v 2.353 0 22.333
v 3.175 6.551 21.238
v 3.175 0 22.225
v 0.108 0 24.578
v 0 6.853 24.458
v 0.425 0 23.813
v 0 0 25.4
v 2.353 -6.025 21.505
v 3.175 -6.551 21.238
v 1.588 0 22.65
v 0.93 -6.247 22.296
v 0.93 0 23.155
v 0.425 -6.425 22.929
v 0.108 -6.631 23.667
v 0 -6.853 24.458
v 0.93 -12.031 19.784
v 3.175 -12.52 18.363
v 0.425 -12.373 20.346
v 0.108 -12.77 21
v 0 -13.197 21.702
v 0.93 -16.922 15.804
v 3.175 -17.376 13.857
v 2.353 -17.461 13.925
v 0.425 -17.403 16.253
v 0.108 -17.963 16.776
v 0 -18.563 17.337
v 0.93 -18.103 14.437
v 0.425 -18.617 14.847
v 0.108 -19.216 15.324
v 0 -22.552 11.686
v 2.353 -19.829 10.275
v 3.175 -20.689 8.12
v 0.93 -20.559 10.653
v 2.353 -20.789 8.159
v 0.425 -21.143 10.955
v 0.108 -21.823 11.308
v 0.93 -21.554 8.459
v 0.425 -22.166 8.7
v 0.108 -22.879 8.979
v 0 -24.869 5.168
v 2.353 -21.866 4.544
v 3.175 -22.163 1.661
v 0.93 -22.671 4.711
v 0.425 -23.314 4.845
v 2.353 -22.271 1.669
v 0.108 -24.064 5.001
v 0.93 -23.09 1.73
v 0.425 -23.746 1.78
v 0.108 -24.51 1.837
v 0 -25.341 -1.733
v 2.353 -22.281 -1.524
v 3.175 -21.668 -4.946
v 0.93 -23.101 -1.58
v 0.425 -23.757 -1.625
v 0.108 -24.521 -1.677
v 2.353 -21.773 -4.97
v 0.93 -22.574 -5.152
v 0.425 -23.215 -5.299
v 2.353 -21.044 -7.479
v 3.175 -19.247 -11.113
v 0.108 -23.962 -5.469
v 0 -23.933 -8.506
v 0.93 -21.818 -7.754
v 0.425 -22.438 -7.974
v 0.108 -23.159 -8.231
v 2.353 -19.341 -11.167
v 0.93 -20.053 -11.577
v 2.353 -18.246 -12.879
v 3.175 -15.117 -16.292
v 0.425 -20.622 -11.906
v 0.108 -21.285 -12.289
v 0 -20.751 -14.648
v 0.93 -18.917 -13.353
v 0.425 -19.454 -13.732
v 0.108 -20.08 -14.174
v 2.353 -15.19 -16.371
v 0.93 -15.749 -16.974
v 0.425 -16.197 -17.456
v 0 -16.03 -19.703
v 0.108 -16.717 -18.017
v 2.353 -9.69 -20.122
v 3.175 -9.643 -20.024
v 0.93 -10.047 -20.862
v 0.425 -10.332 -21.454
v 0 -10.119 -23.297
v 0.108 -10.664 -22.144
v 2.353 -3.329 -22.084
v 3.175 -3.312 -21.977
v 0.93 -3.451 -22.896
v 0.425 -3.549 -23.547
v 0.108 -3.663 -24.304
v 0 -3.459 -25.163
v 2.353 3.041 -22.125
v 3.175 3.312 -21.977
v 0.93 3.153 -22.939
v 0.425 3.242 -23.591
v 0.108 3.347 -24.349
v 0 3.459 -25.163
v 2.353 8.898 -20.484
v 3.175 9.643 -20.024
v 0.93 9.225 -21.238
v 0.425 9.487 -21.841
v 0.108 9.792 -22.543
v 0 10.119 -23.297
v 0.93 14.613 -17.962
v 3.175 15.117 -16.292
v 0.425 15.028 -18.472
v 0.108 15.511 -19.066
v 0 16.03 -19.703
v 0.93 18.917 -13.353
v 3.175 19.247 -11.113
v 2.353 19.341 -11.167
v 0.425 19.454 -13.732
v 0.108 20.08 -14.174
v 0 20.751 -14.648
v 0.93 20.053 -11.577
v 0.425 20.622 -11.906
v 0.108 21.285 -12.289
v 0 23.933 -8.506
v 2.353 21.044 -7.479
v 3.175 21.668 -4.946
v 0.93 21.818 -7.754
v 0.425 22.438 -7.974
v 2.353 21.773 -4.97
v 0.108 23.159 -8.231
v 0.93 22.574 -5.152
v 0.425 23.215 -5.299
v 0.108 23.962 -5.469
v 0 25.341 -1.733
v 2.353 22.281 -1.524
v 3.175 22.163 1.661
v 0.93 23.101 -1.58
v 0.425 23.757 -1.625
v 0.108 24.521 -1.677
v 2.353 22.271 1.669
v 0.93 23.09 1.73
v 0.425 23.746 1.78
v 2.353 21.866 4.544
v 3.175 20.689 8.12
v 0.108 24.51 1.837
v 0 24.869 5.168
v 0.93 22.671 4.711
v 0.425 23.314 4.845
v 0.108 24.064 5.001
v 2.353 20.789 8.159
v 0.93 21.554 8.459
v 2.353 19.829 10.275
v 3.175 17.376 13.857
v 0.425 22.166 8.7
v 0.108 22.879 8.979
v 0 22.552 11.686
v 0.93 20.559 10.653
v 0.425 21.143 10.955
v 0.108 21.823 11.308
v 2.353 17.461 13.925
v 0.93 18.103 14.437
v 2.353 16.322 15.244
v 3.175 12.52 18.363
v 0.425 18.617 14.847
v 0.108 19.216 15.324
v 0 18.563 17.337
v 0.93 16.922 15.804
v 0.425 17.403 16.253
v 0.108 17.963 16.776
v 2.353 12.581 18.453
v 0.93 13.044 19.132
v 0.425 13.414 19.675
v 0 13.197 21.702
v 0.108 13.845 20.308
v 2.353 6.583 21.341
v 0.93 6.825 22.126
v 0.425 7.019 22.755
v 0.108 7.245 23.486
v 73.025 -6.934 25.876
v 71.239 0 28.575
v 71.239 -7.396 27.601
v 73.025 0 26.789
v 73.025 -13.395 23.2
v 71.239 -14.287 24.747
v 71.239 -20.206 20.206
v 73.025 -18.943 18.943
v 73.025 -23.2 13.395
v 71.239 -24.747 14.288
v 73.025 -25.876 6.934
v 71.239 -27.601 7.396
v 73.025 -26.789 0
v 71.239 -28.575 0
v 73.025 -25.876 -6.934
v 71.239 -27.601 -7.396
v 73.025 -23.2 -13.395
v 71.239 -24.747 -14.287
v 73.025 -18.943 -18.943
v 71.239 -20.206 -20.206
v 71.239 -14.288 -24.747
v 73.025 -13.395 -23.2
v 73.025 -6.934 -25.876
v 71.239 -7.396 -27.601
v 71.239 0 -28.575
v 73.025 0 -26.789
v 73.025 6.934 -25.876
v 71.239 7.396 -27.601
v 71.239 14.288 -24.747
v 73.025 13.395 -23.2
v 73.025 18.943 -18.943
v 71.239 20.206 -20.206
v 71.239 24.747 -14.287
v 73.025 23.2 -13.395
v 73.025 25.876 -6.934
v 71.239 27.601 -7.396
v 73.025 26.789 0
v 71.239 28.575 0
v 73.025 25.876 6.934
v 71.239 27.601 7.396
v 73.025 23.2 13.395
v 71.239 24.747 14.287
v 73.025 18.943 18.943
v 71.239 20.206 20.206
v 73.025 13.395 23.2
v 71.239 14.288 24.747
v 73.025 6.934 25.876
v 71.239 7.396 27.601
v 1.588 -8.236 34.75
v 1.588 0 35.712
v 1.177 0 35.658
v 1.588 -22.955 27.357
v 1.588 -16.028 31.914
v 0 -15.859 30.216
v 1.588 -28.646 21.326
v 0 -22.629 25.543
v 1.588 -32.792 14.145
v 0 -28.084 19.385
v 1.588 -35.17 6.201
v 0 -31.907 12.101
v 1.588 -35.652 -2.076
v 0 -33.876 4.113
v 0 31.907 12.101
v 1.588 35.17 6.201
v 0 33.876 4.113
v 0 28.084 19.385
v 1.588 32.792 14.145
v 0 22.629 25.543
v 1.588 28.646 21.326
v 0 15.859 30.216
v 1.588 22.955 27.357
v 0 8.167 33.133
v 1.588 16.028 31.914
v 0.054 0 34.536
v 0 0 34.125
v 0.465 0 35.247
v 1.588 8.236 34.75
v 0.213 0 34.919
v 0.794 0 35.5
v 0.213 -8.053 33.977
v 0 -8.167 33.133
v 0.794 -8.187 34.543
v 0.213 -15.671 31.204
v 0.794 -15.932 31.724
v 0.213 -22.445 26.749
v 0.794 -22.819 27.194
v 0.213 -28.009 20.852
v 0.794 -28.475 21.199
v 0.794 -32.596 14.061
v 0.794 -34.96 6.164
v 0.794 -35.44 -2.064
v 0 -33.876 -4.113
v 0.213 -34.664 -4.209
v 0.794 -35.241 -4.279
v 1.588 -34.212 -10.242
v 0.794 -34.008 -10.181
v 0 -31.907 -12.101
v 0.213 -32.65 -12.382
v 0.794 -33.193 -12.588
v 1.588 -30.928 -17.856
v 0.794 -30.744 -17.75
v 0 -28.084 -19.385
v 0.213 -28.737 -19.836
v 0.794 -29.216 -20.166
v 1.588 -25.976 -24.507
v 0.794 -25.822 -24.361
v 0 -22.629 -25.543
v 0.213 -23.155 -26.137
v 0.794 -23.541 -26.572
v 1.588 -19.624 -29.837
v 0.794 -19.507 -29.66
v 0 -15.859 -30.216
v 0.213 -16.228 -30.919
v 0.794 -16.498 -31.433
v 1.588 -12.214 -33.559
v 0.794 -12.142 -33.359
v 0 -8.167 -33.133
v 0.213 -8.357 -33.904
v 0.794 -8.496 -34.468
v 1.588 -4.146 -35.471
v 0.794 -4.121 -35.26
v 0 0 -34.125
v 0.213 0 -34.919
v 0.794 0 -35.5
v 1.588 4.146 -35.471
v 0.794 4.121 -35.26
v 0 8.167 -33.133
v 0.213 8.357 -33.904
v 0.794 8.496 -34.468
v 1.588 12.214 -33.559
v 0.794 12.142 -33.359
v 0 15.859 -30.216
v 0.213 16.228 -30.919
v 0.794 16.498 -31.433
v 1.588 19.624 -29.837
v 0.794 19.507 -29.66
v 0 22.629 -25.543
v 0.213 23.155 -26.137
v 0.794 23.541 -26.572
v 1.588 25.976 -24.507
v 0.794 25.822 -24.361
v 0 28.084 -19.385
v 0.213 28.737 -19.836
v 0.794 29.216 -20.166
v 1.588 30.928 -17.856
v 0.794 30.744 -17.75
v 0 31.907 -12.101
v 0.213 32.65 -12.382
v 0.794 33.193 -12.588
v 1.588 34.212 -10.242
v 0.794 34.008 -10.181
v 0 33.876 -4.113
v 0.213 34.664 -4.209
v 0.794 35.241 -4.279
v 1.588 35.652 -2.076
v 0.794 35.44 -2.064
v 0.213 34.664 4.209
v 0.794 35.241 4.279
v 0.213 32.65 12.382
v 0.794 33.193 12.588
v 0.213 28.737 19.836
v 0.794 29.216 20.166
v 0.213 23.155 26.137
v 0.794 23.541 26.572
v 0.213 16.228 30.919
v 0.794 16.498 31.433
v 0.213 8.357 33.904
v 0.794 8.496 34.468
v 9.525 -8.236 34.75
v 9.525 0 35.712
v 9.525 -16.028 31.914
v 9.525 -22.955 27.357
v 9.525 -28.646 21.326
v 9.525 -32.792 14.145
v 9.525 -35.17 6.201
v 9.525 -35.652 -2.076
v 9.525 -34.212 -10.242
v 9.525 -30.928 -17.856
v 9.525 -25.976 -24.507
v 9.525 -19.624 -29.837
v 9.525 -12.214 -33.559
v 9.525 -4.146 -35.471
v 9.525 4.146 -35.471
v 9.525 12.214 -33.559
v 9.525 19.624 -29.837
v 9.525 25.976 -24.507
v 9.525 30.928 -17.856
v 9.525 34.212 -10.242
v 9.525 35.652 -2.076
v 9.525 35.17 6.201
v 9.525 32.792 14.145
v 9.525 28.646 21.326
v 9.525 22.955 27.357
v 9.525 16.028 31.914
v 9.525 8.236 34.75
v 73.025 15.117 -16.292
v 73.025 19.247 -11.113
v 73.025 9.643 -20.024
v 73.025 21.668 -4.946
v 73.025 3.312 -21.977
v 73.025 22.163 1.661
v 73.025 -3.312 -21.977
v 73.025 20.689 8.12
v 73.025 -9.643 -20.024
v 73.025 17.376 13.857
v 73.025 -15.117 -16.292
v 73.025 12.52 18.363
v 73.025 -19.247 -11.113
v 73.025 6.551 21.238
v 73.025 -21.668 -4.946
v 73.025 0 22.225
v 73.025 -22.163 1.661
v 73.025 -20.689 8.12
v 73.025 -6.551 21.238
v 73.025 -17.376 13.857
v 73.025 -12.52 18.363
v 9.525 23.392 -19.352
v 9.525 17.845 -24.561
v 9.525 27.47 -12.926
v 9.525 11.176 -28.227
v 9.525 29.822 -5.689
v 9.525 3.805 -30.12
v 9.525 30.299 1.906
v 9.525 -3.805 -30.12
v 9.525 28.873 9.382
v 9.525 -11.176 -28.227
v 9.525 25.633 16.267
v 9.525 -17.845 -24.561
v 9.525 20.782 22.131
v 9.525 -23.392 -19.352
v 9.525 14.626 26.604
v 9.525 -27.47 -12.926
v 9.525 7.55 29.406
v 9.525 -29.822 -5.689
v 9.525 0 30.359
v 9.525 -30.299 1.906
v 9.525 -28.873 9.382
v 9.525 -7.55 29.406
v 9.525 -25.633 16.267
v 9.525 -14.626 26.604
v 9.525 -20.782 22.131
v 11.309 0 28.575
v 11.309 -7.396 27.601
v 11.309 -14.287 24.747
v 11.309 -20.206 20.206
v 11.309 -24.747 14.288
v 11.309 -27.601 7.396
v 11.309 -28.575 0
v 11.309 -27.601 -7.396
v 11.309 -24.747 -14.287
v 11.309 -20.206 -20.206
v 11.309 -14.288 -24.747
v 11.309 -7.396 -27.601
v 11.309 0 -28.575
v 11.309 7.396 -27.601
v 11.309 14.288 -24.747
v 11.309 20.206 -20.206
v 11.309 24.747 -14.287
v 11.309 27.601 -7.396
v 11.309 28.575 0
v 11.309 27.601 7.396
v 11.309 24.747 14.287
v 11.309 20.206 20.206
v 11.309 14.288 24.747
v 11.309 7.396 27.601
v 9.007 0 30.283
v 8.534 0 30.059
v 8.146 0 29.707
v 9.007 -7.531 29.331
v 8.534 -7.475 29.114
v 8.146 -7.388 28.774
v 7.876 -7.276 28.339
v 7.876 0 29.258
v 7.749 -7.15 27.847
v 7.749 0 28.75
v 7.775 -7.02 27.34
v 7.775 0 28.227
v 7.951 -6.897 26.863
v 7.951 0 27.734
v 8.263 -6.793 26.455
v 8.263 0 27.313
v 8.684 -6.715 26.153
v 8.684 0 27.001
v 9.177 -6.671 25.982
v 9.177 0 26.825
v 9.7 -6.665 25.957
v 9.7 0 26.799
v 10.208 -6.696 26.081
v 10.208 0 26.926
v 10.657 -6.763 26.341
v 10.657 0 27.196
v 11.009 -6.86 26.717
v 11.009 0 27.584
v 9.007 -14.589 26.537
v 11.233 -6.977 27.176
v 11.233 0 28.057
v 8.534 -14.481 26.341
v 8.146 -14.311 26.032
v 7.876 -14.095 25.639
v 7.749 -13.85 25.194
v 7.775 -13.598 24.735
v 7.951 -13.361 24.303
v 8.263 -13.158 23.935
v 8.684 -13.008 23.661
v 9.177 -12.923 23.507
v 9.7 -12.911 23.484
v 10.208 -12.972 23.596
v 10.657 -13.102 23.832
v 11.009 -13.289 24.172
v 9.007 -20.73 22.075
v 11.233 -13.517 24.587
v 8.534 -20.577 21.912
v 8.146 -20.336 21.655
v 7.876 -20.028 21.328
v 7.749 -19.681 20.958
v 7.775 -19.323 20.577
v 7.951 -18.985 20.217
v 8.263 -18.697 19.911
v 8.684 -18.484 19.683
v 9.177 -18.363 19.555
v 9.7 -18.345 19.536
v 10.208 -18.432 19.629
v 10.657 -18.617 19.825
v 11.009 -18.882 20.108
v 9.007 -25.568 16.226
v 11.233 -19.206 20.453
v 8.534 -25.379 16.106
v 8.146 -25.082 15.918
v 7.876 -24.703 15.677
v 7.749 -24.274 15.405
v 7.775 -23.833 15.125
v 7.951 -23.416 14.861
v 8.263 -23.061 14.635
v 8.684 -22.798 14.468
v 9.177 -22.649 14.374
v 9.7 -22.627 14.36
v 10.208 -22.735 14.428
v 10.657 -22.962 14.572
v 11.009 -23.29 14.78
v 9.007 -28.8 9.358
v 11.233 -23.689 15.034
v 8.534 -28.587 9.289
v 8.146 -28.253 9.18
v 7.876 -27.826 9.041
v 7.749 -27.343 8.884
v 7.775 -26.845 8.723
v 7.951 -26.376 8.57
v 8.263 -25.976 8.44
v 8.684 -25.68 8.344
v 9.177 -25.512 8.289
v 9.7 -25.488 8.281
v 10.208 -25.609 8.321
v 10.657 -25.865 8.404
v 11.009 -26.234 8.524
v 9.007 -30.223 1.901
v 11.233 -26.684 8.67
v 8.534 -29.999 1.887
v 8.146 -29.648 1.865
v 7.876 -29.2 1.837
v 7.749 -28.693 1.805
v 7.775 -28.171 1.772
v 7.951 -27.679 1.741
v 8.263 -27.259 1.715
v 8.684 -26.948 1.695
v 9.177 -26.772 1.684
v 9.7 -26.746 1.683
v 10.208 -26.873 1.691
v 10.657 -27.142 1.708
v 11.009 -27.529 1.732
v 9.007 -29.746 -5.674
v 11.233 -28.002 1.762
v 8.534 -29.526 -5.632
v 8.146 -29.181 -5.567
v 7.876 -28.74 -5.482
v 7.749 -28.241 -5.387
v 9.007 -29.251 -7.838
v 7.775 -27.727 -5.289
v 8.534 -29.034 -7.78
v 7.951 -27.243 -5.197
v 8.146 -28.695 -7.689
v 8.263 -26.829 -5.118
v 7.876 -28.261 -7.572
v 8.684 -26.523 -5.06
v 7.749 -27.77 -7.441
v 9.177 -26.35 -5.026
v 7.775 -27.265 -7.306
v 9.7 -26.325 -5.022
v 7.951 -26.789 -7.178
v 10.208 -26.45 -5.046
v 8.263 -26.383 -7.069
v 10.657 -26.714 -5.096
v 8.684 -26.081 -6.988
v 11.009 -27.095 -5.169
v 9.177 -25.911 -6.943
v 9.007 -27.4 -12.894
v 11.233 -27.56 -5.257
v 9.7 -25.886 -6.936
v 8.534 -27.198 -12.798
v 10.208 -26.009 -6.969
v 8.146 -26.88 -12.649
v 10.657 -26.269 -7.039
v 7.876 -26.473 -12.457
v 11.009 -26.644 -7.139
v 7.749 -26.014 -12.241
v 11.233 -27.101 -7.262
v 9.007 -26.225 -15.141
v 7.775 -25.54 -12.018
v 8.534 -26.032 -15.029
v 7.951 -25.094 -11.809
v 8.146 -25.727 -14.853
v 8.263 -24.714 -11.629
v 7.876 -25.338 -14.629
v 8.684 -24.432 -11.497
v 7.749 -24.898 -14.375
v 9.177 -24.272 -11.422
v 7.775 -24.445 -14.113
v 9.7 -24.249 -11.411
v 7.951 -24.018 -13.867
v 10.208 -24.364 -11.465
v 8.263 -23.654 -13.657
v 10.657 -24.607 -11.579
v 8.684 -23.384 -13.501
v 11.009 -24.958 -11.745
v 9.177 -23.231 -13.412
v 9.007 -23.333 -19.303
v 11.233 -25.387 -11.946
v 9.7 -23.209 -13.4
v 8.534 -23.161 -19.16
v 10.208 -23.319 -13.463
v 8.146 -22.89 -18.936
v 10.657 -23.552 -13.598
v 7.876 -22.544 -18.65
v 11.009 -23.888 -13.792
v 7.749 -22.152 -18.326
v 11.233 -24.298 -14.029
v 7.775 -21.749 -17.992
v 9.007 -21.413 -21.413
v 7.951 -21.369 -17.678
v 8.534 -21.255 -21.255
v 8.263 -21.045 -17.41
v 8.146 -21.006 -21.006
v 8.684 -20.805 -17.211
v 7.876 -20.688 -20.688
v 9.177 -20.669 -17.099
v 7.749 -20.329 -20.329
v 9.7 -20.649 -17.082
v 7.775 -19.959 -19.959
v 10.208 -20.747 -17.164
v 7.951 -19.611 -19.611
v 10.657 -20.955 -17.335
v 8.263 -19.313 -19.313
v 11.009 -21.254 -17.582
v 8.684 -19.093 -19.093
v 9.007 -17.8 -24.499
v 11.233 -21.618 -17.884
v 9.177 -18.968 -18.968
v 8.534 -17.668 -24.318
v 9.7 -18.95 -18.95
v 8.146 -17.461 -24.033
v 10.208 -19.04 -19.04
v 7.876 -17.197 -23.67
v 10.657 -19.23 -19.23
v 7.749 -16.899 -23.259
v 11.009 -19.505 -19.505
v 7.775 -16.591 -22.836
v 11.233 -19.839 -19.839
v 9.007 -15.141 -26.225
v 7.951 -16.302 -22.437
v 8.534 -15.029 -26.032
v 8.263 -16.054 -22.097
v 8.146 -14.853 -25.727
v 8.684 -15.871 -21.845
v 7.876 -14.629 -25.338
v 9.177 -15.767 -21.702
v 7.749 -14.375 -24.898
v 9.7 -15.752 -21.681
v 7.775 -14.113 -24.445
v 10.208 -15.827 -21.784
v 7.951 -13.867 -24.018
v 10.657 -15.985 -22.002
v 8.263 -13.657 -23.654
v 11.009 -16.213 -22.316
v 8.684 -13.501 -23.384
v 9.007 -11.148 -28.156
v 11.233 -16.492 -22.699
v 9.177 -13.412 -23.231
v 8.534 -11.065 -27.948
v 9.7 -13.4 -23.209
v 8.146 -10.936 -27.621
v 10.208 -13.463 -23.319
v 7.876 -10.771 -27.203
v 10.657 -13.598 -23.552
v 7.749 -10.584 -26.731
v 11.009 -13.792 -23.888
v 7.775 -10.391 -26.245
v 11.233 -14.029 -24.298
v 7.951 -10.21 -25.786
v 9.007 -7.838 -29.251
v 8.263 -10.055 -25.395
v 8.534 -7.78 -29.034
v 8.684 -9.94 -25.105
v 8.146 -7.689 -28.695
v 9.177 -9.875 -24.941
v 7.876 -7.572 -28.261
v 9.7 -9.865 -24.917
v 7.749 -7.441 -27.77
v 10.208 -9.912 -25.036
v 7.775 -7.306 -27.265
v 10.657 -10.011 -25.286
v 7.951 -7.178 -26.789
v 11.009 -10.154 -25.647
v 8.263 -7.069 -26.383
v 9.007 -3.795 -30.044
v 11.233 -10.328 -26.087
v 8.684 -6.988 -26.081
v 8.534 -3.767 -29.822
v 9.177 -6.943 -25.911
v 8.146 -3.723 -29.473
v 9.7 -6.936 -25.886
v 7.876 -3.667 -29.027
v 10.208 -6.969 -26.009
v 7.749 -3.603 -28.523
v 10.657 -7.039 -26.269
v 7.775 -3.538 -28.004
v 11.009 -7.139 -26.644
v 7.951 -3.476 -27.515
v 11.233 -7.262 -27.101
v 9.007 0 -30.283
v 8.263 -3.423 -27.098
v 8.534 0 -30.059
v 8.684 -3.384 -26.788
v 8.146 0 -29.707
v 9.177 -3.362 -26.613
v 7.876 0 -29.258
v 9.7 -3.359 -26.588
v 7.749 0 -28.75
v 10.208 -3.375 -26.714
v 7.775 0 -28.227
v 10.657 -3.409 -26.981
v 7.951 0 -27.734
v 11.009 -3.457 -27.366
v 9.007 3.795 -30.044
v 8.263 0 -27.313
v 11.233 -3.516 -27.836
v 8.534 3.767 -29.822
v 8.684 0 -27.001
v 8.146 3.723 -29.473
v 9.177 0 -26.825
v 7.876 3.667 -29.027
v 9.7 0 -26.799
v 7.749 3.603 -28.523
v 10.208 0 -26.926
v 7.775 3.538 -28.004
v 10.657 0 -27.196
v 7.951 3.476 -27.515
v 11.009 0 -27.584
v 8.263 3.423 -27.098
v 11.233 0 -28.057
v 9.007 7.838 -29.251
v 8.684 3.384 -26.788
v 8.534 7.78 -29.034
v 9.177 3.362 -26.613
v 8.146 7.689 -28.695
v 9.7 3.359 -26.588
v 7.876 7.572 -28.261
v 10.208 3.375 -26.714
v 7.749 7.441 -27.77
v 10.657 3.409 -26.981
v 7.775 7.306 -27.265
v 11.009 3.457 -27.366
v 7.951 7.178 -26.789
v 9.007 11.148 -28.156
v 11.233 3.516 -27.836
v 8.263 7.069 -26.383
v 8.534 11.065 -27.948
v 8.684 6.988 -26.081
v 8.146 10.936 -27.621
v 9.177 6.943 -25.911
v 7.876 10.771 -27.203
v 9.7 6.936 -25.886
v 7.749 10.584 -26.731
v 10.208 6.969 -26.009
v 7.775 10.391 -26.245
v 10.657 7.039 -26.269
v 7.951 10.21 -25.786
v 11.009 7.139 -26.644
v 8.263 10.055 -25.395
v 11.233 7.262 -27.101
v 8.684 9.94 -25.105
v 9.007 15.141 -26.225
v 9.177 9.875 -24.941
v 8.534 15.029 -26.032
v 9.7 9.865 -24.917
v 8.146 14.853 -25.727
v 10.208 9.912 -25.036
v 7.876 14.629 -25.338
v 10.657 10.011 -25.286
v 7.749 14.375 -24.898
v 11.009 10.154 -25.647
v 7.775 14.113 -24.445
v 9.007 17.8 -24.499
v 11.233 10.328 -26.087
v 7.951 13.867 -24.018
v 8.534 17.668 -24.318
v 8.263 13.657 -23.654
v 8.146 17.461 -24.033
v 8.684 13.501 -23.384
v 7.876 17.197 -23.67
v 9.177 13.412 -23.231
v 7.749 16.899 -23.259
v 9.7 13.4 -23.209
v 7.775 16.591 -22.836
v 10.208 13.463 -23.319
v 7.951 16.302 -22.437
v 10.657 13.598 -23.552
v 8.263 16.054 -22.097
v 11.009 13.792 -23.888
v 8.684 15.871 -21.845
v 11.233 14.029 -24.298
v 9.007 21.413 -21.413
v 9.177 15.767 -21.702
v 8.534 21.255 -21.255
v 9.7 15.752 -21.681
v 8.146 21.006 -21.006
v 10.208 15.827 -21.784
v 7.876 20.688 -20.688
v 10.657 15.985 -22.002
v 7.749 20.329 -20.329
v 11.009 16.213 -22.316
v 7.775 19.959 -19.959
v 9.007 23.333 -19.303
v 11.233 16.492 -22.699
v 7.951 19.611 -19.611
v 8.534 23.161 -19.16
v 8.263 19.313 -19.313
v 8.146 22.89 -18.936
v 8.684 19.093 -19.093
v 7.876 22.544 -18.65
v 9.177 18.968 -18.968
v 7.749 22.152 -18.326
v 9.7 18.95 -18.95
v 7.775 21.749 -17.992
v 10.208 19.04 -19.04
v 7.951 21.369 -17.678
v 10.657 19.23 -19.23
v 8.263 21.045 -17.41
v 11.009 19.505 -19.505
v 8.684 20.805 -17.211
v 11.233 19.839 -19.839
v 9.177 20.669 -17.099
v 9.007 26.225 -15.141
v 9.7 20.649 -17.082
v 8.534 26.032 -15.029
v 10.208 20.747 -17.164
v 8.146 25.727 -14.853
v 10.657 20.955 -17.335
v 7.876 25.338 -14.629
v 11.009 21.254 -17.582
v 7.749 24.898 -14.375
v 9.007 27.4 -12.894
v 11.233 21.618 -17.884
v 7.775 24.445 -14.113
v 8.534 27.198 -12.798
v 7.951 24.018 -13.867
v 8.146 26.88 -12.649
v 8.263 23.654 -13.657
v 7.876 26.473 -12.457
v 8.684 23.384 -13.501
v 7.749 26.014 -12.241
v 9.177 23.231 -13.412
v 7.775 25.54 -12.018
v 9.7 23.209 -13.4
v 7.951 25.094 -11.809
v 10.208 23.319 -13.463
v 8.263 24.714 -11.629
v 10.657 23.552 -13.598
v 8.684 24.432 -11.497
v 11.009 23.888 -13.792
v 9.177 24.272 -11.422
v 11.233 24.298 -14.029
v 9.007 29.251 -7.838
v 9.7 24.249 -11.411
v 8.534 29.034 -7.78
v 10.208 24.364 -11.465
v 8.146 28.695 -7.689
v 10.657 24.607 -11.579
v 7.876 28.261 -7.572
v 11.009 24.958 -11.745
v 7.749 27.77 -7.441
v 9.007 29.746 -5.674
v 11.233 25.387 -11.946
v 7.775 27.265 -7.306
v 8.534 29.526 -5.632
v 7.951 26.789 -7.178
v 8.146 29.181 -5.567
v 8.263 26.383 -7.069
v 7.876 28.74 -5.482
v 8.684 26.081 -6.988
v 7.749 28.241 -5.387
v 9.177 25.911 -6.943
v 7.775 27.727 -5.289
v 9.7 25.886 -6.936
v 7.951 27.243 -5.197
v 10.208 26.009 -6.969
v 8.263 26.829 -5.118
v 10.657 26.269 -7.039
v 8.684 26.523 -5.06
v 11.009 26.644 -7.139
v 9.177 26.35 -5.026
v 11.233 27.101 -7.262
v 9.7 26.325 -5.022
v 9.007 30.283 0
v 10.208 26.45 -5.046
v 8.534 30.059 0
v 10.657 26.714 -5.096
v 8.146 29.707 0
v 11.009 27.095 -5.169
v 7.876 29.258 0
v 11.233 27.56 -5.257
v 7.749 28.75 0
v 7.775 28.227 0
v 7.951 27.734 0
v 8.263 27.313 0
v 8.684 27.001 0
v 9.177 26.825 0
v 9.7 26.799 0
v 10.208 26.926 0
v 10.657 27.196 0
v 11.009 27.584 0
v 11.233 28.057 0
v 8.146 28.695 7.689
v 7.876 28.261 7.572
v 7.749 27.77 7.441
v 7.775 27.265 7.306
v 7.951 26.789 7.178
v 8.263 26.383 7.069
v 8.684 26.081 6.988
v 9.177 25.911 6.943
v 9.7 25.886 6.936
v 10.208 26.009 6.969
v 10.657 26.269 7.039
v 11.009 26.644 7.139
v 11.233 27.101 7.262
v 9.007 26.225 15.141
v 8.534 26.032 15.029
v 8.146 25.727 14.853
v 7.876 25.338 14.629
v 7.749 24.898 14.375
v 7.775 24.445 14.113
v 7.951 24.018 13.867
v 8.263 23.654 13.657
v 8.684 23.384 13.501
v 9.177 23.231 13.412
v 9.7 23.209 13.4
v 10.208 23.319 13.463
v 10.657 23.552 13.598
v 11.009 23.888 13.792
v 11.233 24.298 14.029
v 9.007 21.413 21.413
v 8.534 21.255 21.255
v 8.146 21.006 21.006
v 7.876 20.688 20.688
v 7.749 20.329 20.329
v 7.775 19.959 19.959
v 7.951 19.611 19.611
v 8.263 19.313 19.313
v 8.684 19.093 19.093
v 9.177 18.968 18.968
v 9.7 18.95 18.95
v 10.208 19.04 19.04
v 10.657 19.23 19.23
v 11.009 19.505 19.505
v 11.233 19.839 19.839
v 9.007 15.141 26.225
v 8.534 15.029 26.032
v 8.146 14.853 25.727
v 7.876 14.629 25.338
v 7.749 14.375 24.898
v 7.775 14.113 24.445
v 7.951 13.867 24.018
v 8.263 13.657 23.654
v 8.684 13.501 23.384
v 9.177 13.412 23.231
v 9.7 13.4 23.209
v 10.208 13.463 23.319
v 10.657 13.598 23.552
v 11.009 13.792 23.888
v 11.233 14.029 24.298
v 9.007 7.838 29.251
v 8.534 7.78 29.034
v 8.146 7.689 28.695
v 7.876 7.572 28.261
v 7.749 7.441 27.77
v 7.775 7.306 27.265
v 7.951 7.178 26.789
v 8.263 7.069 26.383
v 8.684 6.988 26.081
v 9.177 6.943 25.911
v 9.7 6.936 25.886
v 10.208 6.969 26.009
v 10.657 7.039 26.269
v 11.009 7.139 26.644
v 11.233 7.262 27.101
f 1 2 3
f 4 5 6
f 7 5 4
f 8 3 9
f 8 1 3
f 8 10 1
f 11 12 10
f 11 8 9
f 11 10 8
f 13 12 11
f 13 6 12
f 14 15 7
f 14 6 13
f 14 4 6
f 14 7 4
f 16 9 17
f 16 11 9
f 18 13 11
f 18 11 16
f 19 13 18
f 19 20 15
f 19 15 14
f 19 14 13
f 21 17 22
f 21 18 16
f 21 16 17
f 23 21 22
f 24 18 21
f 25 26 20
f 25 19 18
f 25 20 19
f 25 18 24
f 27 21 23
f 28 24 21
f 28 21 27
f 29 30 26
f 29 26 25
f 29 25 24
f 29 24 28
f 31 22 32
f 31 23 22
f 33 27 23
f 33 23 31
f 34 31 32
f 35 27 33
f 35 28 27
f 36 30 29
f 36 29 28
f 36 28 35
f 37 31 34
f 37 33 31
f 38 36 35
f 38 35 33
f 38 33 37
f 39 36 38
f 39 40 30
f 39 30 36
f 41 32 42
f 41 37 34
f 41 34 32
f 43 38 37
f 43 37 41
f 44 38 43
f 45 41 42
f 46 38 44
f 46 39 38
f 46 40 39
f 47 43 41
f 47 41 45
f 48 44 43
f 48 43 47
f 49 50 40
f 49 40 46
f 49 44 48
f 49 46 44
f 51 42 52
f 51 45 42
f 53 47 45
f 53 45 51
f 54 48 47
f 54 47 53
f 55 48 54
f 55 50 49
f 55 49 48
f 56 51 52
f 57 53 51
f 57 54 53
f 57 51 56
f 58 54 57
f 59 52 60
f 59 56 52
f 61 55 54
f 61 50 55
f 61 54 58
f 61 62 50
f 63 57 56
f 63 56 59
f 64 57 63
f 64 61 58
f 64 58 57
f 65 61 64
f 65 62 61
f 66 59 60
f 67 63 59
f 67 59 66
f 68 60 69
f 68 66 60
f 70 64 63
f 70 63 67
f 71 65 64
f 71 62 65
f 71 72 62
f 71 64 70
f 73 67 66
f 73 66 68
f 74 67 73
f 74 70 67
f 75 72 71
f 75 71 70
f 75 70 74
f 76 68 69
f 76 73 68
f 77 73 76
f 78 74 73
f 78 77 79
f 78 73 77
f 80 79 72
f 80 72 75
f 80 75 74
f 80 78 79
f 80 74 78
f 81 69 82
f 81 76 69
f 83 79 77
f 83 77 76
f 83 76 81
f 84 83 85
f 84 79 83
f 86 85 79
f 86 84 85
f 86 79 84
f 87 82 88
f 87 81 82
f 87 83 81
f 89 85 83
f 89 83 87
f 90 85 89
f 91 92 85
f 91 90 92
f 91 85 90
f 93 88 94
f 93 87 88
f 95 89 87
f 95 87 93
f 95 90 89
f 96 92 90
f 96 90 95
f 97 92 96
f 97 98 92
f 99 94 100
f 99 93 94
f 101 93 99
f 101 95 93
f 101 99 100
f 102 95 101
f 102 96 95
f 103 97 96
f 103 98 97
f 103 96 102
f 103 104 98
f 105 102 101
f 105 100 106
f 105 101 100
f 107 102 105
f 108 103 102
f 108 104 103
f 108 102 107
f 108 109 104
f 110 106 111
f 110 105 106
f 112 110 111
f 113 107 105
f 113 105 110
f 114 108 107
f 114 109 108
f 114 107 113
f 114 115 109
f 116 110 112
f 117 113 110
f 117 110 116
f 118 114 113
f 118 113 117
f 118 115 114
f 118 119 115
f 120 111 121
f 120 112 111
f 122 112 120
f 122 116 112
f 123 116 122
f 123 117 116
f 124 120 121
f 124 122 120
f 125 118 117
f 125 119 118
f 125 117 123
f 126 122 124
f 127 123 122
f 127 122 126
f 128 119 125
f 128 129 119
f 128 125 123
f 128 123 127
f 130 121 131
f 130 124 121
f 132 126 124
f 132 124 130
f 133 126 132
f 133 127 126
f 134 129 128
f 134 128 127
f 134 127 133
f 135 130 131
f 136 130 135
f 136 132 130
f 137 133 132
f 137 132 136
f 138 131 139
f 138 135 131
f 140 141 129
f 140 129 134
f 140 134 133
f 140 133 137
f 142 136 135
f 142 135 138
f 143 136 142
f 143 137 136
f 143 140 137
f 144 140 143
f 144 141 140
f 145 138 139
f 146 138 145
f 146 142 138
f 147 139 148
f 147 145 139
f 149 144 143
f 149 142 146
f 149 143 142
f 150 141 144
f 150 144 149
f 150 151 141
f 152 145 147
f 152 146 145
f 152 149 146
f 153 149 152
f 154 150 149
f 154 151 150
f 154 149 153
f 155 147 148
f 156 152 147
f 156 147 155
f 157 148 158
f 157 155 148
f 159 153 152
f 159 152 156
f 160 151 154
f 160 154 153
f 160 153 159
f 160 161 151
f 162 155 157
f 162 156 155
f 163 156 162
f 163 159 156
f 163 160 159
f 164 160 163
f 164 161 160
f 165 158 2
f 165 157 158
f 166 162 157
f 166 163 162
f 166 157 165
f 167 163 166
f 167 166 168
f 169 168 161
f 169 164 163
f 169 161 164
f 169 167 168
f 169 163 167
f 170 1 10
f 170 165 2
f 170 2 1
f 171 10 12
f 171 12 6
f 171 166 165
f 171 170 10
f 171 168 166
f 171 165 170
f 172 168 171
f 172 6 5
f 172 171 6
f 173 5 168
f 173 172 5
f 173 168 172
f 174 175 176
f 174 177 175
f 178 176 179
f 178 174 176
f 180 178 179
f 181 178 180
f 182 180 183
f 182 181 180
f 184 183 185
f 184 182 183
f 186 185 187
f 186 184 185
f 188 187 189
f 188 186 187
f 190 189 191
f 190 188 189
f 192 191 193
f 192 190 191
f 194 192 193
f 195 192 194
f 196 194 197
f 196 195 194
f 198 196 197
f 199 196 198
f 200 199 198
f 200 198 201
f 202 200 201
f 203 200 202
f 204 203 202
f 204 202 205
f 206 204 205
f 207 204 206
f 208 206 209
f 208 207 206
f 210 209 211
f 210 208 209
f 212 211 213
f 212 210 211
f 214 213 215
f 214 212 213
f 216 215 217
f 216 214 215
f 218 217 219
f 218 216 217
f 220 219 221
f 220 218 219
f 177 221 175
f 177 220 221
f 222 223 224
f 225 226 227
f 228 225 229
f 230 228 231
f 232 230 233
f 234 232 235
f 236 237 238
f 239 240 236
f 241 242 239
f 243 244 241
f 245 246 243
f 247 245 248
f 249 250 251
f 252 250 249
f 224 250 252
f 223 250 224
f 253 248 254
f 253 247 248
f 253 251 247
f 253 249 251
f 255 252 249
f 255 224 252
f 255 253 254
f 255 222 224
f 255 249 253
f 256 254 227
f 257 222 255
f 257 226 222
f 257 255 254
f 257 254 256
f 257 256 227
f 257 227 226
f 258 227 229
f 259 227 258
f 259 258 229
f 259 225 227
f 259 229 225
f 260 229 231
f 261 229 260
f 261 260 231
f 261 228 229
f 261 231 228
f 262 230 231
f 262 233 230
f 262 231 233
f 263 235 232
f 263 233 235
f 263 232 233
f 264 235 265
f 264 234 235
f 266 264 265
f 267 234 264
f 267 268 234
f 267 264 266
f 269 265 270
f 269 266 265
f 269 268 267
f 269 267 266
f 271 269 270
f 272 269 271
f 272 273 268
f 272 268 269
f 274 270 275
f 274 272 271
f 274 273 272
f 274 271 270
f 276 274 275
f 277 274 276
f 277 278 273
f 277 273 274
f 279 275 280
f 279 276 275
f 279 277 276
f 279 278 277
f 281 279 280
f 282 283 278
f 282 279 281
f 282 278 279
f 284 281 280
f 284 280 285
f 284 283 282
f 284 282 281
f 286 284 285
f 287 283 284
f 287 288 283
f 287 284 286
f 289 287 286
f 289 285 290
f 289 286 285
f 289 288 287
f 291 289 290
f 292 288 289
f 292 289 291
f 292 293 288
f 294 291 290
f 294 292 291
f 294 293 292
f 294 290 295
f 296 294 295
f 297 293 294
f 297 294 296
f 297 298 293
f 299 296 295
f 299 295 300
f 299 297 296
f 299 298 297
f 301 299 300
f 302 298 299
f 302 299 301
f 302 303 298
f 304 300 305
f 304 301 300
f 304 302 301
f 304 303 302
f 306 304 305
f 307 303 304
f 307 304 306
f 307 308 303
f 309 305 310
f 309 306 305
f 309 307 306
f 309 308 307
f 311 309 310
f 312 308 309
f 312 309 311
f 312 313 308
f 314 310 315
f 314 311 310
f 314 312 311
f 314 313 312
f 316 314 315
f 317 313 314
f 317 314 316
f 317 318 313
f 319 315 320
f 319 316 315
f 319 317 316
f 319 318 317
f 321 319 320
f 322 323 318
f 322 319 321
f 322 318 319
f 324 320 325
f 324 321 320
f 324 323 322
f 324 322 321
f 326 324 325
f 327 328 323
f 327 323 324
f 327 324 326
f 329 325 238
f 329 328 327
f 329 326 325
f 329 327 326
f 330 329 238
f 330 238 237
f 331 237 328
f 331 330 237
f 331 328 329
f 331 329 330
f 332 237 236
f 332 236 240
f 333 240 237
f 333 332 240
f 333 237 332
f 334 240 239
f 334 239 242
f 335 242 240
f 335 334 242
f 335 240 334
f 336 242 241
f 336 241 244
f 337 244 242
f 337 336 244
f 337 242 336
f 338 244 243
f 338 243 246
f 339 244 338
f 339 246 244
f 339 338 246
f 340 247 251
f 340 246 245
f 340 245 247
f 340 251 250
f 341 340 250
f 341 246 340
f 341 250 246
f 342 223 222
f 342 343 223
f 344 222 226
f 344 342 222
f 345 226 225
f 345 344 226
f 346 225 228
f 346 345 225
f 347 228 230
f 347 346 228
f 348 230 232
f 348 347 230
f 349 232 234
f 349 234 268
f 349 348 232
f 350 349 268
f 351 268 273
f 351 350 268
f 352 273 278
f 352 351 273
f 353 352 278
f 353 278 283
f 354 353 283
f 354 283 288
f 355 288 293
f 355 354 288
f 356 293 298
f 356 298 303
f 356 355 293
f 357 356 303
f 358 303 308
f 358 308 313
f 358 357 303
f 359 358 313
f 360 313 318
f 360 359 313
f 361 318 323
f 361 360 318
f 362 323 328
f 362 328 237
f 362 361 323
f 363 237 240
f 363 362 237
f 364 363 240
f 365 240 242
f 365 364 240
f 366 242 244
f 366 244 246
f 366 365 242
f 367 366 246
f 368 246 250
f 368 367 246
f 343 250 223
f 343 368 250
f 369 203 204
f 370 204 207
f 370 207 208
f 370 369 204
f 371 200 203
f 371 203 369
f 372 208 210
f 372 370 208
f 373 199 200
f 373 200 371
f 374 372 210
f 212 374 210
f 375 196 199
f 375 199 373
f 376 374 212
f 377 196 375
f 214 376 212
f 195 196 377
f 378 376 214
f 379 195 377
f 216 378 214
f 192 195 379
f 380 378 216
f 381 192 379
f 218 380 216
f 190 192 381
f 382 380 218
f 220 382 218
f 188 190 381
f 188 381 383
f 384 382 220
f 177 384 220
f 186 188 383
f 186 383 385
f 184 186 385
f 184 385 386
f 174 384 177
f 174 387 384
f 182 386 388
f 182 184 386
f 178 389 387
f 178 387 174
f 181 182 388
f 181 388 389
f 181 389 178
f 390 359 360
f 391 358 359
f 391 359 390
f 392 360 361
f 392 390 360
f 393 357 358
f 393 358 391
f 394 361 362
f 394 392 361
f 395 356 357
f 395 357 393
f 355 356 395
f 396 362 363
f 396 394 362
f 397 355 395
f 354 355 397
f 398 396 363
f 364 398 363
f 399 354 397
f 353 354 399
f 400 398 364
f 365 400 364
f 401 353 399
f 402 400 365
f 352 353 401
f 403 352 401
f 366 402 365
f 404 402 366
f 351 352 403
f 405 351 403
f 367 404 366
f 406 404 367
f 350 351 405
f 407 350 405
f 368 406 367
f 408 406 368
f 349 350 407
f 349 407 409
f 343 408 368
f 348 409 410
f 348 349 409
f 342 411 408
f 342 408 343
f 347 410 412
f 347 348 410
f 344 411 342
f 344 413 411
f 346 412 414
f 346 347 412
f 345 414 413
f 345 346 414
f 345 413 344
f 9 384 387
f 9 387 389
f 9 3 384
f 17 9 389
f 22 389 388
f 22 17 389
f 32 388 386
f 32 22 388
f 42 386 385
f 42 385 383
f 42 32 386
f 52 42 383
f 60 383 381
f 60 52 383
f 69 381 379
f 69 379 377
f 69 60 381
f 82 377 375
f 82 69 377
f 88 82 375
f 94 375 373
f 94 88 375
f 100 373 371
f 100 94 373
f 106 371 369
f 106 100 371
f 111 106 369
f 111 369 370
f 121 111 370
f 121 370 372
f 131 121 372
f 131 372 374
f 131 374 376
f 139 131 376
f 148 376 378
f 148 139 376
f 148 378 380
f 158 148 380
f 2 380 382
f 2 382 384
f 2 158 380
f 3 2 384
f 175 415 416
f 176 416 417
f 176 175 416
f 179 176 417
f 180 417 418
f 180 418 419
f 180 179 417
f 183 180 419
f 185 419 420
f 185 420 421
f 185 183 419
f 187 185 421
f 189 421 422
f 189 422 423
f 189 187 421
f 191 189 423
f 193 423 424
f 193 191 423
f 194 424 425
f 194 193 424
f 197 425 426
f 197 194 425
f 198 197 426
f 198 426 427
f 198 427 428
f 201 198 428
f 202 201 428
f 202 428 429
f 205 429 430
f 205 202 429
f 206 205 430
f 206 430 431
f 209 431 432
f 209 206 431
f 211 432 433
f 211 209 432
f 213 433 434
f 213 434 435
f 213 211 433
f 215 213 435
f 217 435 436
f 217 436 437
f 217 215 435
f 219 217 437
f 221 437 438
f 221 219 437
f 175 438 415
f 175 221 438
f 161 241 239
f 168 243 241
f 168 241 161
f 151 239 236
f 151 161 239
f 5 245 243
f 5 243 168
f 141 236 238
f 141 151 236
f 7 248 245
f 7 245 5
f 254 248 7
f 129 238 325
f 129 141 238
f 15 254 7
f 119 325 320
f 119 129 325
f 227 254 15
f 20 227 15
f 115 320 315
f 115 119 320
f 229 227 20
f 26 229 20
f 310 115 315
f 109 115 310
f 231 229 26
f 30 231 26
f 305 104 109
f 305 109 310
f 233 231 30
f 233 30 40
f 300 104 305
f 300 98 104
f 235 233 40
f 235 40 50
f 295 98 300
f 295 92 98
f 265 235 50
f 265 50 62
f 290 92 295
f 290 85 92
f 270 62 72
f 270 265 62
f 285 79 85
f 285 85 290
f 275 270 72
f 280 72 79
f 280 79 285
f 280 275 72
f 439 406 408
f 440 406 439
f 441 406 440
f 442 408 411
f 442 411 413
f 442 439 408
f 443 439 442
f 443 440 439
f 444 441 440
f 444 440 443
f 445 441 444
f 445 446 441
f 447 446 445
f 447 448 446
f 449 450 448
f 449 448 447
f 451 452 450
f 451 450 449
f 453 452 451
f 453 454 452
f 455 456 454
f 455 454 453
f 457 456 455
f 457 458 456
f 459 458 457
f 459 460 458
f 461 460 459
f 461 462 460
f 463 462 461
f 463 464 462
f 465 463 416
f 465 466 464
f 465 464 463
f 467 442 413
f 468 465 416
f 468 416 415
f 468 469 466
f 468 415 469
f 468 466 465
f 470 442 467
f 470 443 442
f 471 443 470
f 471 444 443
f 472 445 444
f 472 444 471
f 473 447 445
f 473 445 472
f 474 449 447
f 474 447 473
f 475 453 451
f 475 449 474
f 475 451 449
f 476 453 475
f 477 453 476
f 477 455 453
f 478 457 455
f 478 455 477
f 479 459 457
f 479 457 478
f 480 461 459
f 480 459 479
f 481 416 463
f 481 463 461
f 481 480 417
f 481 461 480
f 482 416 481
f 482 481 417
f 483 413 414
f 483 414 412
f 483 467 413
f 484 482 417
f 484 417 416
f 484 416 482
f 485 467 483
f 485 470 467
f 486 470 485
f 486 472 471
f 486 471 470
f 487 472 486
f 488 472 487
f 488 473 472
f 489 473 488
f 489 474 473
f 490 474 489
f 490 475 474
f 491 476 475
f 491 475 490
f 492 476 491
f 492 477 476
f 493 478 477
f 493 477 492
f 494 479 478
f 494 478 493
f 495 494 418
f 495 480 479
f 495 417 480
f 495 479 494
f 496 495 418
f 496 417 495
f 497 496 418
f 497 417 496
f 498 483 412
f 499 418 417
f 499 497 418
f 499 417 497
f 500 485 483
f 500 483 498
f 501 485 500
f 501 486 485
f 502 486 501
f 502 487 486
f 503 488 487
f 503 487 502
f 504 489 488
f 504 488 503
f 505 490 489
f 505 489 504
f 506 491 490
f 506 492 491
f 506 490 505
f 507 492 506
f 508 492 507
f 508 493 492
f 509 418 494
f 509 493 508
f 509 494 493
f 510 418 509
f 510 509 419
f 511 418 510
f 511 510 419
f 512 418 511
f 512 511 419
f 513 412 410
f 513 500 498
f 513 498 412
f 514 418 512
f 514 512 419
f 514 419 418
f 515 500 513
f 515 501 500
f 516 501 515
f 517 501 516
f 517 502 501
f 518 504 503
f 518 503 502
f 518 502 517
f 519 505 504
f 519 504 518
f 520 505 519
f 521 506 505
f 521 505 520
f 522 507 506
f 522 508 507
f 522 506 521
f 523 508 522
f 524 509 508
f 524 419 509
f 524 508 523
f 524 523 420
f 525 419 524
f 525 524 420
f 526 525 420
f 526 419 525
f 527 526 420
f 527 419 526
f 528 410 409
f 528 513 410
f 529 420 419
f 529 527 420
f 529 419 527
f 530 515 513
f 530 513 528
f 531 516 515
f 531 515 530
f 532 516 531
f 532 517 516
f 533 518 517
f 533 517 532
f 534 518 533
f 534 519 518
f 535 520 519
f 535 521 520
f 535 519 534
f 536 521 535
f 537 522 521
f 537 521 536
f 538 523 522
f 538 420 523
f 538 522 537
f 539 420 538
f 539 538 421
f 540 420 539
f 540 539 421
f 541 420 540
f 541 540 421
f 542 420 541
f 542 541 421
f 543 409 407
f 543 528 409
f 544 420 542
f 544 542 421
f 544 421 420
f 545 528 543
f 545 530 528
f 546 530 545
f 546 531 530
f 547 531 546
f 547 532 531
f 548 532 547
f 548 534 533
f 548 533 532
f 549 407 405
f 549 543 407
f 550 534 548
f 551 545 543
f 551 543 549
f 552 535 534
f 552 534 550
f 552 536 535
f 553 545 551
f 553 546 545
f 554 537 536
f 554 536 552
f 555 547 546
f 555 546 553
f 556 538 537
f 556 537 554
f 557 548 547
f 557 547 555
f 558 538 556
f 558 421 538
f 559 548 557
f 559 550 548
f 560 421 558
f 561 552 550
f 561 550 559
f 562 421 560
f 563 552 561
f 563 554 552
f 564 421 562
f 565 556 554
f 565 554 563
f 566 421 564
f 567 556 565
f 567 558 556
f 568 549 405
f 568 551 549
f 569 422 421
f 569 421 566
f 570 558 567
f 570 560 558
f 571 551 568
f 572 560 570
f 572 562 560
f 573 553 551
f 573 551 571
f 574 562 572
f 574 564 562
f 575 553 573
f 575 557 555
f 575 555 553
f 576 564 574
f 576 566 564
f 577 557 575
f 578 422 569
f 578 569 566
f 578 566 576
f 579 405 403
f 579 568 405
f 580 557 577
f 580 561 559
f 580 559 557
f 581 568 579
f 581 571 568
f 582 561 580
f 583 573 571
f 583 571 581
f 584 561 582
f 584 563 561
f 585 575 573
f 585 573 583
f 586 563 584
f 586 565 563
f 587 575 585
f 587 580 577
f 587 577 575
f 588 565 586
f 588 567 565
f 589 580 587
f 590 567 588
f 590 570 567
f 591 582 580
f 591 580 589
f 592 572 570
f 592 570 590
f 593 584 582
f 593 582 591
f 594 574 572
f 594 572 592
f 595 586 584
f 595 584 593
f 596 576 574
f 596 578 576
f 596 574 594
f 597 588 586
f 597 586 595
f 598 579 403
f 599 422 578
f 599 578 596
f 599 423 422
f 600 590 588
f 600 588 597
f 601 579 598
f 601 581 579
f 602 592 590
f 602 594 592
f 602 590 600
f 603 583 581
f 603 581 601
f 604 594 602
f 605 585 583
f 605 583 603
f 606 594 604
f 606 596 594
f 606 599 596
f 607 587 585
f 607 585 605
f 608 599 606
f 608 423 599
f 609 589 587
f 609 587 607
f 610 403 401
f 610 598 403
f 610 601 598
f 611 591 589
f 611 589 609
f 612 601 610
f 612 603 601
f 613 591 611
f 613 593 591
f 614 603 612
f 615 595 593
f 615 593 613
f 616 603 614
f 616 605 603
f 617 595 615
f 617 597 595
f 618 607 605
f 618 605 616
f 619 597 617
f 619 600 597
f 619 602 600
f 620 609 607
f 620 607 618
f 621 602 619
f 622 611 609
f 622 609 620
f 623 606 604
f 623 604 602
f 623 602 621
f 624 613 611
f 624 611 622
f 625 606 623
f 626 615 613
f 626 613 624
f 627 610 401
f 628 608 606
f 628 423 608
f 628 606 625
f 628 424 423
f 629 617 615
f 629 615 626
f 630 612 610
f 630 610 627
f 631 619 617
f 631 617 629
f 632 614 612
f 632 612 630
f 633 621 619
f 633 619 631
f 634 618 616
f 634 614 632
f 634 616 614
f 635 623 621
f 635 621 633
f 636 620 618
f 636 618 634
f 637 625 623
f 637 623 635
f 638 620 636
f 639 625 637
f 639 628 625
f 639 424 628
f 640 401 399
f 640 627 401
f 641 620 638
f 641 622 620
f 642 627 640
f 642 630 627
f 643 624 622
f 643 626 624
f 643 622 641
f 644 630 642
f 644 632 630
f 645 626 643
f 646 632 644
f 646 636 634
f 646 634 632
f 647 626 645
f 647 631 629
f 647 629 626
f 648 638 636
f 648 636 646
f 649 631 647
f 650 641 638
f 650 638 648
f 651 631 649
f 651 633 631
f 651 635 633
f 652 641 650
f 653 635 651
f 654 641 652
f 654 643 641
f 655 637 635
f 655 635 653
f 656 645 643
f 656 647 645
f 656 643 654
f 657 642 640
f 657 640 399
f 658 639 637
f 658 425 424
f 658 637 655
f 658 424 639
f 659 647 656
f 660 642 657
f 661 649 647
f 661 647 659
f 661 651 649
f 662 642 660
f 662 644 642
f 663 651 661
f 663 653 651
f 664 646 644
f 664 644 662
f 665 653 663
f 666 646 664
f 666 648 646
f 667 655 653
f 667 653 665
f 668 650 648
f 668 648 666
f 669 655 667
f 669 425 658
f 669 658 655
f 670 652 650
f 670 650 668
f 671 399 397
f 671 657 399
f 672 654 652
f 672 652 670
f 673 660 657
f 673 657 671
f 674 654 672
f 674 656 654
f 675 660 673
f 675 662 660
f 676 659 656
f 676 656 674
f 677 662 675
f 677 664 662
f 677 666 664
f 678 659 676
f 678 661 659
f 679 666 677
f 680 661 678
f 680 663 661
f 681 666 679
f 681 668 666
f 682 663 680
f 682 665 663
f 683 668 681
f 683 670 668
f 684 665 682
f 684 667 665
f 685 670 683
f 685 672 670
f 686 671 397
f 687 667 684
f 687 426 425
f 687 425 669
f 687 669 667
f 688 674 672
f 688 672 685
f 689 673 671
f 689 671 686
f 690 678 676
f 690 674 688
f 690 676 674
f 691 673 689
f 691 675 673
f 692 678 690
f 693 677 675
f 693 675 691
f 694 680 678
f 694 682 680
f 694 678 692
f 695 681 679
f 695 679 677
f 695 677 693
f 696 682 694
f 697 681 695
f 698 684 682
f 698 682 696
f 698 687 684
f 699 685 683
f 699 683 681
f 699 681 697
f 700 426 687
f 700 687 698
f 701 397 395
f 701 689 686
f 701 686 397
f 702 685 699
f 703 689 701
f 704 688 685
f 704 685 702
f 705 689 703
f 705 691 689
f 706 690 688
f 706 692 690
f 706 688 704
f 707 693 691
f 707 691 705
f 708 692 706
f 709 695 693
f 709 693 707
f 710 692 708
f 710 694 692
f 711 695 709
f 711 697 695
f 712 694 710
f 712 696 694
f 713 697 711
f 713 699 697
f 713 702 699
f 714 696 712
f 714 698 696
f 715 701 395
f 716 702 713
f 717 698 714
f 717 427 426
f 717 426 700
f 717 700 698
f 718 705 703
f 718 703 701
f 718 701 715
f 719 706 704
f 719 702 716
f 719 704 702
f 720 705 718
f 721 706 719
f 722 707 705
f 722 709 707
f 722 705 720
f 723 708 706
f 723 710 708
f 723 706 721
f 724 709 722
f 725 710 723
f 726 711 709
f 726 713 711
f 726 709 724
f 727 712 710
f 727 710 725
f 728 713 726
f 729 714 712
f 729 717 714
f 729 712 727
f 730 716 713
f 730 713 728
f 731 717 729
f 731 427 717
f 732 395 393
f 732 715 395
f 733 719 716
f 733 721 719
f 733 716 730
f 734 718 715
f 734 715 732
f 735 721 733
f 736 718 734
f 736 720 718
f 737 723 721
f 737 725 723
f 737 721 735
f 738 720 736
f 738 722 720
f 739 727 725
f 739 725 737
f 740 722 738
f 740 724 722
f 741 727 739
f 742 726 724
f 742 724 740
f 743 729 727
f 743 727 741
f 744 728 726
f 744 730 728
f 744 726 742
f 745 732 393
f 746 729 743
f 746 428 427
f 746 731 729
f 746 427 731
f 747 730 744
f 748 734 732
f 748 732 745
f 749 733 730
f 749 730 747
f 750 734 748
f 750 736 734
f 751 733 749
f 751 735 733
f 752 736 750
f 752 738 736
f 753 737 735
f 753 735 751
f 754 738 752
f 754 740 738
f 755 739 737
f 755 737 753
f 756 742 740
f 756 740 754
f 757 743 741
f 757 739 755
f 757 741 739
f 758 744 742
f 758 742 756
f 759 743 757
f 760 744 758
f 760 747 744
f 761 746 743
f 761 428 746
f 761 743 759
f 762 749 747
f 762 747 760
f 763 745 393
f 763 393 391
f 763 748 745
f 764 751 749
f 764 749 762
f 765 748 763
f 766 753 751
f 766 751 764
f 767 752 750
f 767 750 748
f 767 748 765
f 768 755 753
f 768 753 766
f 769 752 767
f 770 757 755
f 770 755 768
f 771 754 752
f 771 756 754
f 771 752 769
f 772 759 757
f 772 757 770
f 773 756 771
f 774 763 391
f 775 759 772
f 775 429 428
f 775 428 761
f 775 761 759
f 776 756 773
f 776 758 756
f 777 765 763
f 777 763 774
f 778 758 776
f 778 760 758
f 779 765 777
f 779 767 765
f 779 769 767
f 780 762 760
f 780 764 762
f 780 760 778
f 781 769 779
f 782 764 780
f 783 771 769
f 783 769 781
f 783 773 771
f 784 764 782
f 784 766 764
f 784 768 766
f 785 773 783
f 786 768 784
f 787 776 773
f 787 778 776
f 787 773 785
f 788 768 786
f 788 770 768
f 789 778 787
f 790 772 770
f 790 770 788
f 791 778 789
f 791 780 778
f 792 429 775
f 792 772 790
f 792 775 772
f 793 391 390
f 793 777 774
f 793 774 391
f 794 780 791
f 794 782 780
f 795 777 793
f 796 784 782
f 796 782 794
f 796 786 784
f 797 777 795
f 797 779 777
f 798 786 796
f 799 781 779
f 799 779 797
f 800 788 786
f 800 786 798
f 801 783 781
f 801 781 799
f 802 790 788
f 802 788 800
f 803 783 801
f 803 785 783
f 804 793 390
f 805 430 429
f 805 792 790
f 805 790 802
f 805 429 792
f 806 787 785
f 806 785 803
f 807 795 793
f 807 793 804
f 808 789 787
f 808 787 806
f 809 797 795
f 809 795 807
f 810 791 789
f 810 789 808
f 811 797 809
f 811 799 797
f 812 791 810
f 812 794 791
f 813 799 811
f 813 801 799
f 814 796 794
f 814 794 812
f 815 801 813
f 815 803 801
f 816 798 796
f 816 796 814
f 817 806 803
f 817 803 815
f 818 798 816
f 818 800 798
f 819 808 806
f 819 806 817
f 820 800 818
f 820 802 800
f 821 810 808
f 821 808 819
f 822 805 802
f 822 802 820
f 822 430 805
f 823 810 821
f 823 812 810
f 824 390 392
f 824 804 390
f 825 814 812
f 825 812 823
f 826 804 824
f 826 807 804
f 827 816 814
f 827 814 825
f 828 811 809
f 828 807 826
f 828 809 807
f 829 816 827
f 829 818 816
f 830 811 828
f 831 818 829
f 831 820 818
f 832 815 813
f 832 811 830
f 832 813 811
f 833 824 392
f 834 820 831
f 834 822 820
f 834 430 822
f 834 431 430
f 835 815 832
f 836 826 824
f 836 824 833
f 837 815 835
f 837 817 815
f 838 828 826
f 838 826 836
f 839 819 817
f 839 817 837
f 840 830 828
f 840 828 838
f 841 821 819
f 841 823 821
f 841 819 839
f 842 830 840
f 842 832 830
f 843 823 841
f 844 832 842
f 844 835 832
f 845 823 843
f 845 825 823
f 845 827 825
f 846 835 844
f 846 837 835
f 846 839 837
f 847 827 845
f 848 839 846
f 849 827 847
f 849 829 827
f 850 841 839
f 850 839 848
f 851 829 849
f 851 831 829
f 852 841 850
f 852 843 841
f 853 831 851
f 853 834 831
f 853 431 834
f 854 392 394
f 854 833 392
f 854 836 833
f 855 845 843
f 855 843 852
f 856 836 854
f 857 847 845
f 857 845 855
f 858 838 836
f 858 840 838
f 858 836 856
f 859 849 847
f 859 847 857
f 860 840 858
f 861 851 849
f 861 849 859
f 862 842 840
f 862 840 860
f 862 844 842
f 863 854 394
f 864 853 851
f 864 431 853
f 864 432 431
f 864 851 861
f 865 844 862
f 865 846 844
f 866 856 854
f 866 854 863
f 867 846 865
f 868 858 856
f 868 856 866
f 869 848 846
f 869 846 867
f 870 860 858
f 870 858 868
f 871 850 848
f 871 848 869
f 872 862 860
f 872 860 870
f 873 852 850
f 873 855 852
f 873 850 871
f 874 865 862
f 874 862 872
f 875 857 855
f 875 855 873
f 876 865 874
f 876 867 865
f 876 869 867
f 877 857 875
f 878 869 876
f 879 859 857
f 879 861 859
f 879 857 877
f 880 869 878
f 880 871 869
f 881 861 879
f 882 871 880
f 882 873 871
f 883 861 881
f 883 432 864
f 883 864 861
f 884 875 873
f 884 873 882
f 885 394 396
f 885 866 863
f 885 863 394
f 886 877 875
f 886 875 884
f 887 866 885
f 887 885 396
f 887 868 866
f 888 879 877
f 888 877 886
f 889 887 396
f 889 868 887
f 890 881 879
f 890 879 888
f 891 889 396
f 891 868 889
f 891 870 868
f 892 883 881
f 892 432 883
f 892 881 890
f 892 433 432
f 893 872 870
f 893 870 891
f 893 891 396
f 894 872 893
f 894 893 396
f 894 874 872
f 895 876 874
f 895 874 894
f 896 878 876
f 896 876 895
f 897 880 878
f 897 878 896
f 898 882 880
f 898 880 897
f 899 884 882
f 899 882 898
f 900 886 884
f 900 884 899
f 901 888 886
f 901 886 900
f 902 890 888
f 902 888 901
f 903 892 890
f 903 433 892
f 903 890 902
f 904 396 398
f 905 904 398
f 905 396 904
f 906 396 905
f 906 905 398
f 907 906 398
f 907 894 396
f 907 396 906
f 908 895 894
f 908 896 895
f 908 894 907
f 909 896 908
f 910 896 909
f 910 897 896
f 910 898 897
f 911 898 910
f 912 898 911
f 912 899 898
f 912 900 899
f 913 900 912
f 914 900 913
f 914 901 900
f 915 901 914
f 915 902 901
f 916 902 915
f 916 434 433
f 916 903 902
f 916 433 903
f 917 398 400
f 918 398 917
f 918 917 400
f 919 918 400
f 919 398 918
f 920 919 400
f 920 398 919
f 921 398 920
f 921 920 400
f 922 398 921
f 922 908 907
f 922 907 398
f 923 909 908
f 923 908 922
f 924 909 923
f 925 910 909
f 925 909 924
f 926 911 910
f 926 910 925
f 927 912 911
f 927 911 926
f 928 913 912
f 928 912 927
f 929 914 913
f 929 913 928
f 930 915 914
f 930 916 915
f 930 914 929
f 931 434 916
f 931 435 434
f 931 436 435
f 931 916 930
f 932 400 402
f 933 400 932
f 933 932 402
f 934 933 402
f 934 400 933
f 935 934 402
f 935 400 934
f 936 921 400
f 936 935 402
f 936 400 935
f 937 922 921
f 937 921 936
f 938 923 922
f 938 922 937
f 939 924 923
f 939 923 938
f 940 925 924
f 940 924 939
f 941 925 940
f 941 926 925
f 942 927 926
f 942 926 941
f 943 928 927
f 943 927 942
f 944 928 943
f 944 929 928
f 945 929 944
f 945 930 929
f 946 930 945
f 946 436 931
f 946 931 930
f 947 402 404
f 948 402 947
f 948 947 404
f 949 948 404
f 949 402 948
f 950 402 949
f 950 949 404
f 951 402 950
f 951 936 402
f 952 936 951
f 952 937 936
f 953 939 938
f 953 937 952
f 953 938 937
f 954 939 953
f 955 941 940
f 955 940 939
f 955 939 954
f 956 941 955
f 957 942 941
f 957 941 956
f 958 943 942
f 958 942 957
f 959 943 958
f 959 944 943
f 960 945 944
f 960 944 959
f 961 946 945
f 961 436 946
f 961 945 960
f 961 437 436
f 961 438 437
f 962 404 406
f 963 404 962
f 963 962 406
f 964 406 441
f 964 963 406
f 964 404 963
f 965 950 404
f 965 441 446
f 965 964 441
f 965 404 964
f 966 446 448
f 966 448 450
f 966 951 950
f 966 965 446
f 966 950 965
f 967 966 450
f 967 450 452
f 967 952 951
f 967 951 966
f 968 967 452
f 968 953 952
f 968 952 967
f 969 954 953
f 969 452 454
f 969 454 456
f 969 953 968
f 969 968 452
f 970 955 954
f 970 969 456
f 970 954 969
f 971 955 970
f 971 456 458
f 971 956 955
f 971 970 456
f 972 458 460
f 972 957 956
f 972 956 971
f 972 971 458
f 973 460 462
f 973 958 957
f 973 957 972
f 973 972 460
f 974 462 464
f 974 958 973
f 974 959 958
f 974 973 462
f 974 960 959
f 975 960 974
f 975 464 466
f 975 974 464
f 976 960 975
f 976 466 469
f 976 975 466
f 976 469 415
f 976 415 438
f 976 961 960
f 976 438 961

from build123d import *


with BuildPart() as part:
    # Sketch1 → BaseBody (revolve)
    with BuildSketch(Plane.XY, mode=Mode.PRIVATE) as basebody_sk:
        with BuildLine():
            Line((0, 25.4), (0, 34.1249))
            ThreePointArc((0, 34.1249), (0.464967985, 35.247432015), (1.5875, 35.7124))
            Line((1.5875, 35.7124), (9.525, 35.7124))
            Line((9.525, 35.7124), (9.525, 30.35935))
            ThreePointArc((9.525, 30.35935), (8.263274015, 27.313274015), (11.30935, 28.575))
            Line((11.30935, 28.575), (71.2390625, 28.575))
            Line((71.2390625, 28.575), (73.025, 26.7890625))
            Line((73.025, 26.7890625), (73.025, 22.225))
            Line((73.025, 22.225), (3.175, 22.225))
            ThreePointArc((3.175, 22.225), (0.92993597, 23.15493597), (0, 25.4))
        make_face()
    revolve(basebody_sk.sketch.rotate(Axis((0, 0, 0), (1, 0, 0)), 90), axis=Axis((0, 0, 0), (1, 0, 0)))


solid = part.part
